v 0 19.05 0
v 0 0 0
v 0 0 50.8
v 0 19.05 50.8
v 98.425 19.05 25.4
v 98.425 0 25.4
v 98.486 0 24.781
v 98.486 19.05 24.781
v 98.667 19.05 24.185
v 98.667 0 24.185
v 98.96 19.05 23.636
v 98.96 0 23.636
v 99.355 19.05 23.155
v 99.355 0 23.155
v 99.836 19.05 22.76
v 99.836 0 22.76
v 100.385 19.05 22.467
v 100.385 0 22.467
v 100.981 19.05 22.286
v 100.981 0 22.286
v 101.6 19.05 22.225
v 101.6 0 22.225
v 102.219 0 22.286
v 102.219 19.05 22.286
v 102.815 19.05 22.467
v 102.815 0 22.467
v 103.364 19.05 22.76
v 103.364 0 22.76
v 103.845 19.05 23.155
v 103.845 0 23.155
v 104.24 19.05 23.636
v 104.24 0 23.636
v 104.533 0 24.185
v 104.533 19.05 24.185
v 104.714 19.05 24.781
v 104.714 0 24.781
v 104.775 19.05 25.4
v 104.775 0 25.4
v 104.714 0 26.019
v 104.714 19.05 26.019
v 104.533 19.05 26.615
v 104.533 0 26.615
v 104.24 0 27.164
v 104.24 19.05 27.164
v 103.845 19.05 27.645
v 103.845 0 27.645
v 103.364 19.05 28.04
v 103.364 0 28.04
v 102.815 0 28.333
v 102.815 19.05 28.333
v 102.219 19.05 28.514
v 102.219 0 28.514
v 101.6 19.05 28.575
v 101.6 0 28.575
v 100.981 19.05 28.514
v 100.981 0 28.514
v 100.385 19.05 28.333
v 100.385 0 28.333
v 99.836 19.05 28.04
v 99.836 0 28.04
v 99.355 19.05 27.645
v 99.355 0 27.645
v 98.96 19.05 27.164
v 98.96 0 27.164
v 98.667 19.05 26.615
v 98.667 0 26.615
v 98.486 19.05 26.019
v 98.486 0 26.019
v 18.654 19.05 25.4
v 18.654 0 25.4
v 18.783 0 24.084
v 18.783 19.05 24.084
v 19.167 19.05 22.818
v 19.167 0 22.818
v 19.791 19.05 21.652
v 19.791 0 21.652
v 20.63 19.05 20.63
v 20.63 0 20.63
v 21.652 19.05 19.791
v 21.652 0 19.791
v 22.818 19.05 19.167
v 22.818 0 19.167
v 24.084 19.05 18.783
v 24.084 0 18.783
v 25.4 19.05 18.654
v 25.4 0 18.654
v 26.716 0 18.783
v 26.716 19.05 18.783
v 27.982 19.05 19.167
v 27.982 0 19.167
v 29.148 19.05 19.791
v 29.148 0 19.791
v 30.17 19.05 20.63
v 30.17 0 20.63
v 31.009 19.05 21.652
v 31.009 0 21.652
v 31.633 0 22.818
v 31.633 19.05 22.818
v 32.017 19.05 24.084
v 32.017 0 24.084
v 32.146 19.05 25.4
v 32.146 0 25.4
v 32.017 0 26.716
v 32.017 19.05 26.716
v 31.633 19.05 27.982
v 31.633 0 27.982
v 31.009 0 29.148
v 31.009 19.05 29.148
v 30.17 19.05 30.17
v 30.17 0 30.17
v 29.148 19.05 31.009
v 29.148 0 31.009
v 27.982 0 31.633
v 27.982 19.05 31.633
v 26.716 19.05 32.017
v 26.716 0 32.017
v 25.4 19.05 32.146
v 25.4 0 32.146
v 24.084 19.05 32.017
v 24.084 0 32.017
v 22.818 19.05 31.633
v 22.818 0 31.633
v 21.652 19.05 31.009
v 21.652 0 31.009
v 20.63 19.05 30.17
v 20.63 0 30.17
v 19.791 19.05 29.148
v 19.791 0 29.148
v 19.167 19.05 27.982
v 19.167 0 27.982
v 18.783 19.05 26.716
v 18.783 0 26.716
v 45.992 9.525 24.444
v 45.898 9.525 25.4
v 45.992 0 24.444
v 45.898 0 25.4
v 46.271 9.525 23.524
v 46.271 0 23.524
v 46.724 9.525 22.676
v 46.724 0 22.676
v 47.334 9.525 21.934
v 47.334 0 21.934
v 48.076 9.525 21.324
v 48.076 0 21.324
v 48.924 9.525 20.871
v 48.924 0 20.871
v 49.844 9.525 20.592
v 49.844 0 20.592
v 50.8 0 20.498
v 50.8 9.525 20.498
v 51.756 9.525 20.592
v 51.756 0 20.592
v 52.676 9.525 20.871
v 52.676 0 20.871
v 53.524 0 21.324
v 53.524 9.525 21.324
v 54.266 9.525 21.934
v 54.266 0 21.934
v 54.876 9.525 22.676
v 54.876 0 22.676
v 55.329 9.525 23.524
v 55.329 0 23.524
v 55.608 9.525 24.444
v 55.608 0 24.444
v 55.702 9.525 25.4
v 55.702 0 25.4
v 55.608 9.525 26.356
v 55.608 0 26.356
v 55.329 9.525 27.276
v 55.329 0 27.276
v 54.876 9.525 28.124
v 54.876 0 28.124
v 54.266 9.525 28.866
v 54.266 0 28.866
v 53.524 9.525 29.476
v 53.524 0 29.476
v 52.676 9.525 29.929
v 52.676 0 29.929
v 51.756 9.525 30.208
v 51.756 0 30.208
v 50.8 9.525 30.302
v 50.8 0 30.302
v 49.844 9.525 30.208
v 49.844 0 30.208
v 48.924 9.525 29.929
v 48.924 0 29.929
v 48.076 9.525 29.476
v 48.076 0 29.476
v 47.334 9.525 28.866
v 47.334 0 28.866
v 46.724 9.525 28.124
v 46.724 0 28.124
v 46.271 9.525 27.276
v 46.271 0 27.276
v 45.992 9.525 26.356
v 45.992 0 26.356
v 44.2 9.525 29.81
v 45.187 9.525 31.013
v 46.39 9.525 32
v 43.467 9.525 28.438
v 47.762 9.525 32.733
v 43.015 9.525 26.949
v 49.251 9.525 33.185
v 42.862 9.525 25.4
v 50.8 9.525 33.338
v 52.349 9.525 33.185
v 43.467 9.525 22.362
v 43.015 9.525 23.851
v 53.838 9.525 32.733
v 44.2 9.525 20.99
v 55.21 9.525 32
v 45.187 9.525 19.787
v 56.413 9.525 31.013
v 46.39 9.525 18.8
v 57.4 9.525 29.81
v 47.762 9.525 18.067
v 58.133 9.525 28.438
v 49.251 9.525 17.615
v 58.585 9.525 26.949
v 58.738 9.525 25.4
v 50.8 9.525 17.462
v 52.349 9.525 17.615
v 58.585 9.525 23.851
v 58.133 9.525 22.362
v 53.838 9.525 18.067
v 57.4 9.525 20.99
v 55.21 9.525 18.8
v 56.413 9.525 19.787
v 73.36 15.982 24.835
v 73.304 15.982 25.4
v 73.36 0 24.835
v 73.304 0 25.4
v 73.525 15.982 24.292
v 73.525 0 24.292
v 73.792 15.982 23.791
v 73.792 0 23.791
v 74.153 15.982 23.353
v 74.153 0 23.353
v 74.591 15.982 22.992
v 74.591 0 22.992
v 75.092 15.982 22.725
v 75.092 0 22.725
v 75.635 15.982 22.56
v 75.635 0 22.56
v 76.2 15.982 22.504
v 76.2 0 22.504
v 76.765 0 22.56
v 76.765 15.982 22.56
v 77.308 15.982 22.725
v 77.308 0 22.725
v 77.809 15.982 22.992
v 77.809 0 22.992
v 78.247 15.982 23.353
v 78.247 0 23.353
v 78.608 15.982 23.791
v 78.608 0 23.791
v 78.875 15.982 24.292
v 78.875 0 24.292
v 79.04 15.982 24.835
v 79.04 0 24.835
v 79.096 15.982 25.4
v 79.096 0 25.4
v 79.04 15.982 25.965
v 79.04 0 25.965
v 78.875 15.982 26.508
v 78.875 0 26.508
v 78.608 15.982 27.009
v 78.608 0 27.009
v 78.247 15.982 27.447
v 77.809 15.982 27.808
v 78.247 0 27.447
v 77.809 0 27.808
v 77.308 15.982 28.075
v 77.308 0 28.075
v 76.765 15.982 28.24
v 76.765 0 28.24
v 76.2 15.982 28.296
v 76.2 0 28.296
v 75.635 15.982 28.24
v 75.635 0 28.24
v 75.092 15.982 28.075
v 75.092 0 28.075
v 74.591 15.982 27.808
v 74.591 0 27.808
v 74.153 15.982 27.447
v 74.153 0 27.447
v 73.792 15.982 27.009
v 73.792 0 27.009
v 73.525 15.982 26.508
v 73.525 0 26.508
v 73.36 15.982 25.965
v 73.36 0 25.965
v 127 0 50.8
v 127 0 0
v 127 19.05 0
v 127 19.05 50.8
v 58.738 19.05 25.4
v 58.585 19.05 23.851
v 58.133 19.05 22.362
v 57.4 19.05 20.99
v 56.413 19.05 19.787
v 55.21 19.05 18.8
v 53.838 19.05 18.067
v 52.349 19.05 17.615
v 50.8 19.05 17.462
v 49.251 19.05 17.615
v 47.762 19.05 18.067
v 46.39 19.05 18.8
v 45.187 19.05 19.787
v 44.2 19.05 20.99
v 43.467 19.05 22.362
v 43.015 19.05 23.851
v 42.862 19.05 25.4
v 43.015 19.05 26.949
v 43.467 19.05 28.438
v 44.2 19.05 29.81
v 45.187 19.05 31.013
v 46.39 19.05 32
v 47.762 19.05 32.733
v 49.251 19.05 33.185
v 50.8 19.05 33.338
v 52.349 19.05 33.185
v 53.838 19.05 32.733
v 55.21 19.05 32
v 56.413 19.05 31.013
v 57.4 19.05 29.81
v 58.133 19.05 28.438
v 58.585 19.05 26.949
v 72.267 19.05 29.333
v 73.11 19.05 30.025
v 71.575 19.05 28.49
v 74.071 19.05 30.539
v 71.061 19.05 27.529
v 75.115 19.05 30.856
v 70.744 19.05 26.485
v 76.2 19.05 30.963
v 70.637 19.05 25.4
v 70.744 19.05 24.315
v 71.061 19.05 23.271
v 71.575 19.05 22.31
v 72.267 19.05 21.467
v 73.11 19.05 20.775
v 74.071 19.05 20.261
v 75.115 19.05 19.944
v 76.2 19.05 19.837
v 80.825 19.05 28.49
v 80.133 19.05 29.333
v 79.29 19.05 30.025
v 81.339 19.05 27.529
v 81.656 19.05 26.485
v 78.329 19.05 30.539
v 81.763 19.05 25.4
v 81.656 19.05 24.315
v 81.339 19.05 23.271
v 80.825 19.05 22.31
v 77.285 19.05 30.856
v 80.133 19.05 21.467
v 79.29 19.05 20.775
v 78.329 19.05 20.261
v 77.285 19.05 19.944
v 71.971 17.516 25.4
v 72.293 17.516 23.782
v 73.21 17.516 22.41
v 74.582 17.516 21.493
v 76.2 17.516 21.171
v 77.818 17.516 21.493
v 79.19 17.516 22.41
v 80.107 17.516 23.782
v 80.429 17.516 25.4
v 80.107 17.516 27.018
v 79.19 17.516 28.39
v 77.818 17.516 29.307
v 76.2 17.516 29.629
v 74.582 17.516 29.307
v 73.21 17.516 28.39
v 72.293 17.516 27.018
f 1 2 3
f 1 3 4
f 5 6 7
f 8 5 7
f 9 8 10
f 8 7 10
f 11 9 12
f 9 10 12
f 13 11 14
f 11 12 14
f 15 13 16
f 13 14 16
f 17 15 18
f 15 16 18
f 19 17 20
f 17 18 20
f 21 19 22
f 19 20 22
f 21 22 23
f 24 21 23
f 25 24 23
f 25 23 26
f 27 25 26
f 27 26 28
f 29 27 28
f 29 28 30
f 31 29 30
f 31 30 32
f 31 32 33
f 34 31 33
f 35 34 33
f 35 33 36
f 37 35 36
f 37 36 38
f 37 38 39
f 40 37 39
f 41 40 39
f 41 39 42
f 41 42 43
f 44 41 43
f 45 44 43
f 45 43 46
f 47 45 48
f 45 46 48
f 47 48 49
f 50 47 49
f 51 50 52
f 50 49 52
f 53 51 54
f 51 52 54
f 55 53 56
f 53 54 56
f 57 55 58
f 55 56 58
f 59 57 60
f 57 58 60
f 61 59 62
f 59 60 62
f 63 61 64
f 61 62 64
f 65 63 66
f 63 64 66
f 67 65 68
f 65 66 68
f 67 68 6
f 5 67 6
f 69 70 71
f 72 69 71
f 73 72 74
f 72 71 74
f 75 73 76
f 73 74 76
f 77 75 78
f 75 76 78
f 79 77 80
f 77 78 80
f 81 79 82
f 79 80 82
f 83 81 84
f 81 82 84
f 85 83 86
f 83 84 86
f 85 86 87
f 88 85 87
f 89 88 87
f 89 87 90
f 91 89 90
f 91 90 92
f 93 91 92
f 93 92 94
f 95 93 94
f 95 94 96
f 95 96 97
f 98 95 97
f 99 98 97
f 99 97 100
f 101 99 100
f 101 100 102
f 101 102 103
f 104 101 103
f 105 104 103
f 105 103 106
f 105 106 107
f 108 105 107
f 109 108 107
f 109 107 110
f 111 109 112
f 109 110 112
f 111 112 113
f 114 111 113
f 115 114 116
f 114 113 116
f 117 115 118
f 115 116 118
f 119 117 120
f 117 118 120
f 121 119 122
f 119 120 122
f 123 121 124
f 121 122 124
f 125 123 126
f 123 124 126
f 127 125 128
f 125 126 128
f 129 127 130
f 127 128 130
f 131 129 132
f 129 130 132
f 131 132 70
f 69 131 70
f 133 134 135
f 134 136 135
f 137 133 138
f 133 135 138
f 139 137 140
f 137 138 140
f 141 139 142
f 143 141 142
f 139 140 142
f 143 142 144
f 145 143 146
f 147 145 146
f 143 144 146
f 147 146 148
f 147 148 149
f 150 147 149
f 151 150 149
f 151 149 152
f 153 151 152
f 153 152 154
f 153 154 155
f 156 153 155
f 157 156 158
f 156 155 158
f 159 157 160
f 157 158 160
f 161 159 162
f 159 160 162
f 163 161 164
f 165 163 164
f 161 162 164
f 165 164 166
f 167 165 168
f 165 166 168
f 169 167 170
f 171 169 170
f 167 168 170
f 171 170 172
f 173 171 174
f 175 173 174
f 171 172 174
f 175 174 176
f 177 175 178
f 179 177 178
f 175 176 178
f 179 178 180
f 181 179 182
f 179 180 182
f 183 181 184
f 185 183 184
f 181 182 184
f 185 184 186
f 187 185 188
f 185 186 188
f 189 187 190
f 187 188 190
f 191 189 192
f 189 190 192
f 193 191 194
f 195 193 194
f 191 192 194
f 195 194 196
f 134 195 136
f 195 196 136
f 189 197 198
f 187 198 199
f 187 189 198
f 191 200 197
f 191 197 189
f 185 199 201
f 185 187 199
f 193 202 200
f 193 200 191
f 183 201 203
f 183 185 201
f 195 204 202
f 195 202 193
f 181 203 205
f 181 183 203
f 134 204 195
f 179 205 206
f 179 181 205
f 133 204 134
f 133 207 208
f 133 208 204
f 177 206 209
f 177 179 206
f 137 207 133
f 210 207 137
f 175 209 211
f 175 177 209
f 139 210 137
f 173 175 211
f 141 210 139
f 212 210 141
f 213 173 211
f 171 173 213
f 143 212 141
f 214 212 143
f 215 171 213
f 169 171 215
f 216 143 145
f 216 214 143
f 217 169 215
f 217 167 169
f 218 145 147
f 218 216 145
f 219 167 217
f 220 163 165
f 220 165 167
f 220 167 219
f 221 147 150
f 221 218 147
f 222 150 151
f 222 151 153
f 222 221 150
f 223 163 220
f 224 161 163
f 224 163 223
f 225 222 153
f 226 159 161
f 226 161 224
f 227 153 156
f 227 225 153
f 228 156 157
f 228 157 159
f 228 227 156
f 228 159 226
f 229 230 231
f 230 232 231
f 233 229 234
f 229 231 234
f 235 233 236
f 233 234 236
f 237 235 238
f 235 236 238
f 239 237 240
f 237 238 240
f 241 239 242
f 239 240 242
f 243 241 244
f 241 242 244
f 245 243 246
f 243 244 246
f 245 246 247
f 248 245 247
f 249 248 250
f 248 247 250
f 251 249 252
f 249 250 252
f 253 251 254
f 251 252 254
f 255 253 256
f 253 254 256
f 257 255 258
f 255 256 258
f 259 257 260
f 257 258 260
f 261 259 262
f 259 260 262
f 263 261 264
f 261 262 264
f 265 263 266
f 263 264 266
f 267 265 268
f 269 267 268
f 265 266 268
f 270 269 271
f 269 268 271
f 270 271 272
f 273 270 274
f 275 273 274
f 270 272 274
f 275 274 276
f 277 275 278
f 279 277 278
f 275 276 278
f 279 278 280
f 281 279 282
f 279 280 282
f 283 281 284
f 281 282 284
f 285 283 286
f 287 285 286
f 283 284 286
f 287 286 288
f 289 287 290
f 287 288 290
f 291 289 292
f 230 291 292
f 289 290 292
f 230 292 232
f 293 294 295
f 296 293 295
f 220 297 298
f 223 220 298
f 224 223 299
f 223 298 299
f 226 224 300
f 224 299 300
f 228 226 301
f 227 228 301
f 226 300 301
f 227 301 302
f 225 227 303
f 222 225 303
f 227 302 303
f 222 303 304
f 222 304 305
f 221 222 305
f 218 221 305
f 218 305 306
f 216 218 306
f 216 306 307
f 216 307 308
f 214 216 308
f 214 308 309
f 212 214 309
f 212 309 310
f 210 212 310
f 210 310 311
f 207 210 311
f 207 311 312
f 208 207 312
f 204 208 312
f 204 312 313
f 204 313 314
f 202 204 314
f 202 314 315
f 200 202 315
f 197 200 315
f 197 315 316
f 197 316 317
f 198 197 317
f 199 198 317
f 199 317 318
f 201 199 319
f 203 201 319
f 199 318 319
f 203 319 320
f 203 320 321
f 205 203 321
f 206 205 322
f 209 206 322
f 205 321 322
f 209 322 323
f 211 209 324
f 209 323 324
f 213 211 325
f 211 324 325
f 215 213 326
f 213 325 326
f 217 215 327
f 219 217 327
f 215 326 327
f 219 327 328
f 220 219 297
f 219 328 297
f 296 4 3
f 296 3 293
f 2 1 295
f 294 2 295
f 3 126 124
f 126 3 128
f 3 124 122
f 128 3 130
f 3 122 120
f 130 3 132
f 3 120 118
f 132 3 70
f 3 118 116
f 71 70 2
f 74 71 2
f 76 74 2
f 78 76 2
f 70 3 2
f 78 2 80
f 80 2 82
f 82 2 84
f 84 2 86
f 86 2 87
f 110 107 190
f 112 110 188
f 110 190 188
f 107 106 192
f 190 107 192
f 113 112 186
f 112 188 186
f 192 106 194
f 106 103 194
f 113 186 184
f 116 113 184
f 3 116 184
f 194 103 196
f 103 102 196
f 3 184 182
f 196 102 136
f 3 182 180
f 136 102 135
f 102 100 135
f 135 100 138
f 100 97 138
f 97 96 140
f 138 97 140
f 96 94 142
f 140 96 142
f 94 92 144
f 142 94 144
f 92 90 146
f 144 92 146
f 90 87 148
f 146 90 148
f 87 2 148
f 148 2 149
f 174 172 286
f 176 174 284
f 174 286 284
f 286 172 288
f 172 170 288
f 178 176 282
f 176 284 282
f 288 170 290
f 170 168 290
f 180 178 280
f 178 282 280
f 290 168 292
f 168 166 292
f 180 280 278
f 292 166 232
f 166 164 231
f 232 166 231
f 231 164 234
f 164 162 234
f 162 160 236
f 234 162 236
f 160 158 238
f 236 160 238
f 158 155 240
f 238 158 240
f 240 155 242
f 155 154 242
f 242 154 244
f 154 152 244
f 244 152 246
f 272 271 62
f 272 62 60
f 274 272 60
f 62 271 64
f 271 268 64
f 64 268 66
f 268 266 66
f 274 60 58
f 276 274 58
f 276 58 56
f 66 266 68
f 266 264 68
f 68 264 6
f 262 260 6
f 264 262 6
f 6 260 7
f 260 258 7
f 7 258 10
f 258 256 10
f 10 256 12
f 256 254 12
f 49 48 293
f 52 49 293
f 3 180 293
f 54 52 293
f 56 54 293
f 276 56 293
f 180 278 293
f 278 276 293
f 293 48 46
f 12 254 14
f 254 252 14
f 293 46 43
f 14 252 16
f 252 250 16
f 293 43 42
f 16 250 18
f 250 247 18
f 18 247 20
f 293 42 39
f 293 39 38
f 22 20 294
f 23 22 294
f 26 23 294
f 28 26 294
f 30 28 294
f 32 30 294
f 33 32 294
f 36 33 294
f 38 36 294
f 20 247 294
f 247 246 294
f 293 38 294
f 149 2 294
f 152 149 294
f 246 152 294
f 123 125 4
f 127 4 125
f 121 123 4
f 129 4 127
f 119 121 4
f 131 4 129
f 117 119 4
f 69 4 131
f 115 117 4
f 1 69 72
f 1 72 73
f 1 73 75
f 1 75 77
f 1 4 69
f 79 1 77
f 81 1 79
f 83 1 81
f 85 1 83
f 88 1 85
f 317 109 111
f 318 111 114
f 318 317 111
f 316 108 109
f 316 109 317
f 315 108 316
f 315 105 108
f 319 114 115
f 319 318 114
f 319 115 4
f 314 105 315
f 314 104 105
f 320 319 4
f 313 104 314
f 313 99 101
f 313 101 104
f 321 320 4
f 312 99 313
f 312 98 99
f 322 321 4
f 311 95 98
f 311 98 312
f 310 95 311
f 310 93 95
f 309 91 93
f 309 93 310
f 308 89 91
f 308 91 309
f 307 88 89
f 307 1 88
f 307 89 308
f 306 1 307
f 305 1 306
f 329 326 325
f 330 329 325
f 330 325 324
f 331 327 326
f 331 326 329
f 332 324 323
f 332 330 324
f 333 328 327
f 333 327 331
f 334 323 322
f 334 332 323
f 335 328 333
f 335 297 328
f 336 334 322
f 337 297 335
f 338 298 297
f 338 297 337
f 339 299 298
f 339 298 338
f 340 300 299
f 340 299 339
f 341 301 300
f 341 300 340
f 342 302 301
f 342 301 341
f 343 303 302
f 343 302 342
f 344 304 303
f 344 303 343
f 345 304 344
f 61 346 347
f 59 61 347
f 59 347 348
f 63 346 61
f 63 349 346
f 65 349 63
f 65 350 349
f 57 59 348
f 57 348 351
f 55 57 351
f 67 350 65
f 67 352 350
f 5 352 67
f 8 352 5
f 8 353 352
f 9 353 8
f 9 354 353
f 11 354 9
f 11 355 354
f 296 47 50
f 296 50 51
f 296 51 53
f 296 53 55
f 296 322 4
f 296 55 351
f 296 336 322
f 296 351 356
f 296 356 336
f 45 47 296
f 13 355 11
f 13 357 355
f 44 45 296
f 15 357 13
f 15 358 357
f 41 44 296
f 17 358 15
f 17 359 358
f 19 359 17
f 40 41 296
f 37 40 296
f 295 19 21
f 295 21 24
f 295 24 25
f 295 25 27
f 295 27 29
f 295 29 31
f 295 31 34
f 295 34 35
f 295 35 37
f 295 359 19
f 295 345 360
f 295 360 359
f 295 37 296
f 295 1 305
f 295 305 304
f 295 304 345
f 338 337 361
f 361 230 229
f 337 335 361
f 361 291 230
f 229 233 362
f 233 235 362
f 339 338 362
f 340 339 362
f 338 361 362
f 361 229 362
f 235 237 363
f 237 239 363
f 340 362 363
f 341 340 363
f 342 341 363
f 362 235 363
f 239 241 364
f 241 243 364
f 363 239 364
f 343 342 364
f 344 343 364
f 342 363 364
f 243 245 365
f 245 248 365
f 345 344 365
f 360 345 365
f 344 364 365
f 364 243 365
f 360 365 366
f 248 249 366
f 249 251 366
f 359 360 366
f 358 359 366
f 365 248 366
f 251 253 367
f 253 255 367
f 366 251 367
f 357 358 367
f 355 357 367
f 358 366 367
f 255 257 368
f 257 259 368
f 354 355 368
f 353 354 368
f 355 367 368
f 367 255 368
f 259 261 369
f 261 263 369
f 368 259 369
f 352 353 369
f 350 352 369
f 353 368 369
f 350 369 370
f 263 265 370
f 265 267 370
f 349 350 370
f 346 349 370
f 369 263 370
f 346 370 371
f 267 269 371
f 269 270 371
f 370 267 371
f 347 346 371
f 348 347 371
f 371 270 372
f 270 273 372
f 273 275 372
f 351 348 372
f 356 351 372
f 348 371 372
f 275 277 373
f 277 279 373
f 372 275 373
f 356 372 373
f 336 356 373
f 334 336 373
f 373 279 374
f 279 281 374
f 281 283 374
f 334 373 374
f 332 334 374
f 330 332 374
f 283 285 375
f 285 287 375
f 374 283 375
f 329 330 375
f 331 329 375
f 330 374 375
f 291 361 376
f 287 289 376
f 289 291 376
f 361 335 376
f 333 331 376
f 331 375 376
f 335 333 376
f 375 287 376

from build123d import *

# Parameters (mm, degrees)
SKETCH1_W                                        = 127
SKETCH1_H                                        = 19.05
BOSS_EXTRUDE1_DEPTH                              = 50.8
F_1_2_CLEARANCE_HOLE1_D                          = 13.49248
CBORE_FOR_3_8_SOCKET_HEAD_CAP_SCREW1_D           = 9.8044
CBORE_FOR_3_8_SOCKET_HEAD_CAP_SCREW1_CBORE_D     = 15.875
CBORE_FOR_3_8_SOCKET_HEAD_CAP_SCREW1_CBORE_DEPTH = 9.525
CSK_FOR_12_FLAT_HEAD_MACHINE_SCREW1_D            = 5.7912
CSK_FOR_12_FLAT_HEAD_MACHINE_SCREW1_CSINK_D      = 11.1252
CSK_FOR_12_FLAT_HEAD_MACHINE_SCREW1_CSINK_ANGLE  = 82
F_1_4_0_2500_DOWEL_HOLE1_D                       = 6.35


with BuildPart() as part:
    # Sketch1 → Boss-Extrude1 (new body)
    with BuildSketch(Plane.XY):
        with Locations((63.5, 9.525)):
            Rectangle(SKETCH1_W, SKETCH1_H)
    extrude(amount=BOSS_EXTRUDE1_DEPTH)

    # 1/2 Clearance Hole1 (through all)
    with Locations(Plane(origin=(0, 19.05, 0), x_dir=(1, 0, 0), z_dir=(0, 1, 0))):
        with Locations((25.4, -25.4)):
            Hole(F_1_2_CLEARANCE_HOLE1_D / 2)

    # CBORE for 3/8 Socket Head Cap Screw1 (through all)
    with Locations(Plane(origin=(0, 19.05, 0), x_dir=(1, 0, 0), z_dir=(0, 1, 0))):
        with Locations((50.8, -25.4)):
            CounterBoreHole(CBORE_FOR_3_8_SOCKET_HEAD_CAP_SCREW1_D / 2, CBORE_FOR_3_8_SOCKET_HEAD_CAP_SCREW1_CBORE_D / 2, CBORE_FOR_3_8_SOCKET_HEAD_CAP_SCREW1_CBORE_DEPTH)

    # CSK for #12 Flat Head Machine Screw1 (through all)
    with Locations(Plane(origin=(0, 19.05, 0), x_dir=(1, 0, 0), z_dir=(0, 1, 0))):
        with Locations((76.2, -25.4)):
            CounterSinkHole(CSK_FOR_12_FLAT_HEAD_MACHINE_SCREW1_D / 2, CSK_FOR_12_FLAT_HEAD_MACHINE_SCREW1_CSINK_D / 2, counter_sink_angle=CSK_FOR_12_FLAT_HEAD_MACHINE_SCREW1_CSINK_ANGLE)

    # 1/4 (0.2500) Dowel Hole1 (through all)
    with Locations(Plane(origin=(0, 19.05, 0), x_dir=(1, 0, 0), z_dir=(0, 1, 0))):
        with Locations((101.6, -25.4)):
            Hole(F_1_4_0_2500_DOWEL_HOLE1_D / 2)


solid = part.part
